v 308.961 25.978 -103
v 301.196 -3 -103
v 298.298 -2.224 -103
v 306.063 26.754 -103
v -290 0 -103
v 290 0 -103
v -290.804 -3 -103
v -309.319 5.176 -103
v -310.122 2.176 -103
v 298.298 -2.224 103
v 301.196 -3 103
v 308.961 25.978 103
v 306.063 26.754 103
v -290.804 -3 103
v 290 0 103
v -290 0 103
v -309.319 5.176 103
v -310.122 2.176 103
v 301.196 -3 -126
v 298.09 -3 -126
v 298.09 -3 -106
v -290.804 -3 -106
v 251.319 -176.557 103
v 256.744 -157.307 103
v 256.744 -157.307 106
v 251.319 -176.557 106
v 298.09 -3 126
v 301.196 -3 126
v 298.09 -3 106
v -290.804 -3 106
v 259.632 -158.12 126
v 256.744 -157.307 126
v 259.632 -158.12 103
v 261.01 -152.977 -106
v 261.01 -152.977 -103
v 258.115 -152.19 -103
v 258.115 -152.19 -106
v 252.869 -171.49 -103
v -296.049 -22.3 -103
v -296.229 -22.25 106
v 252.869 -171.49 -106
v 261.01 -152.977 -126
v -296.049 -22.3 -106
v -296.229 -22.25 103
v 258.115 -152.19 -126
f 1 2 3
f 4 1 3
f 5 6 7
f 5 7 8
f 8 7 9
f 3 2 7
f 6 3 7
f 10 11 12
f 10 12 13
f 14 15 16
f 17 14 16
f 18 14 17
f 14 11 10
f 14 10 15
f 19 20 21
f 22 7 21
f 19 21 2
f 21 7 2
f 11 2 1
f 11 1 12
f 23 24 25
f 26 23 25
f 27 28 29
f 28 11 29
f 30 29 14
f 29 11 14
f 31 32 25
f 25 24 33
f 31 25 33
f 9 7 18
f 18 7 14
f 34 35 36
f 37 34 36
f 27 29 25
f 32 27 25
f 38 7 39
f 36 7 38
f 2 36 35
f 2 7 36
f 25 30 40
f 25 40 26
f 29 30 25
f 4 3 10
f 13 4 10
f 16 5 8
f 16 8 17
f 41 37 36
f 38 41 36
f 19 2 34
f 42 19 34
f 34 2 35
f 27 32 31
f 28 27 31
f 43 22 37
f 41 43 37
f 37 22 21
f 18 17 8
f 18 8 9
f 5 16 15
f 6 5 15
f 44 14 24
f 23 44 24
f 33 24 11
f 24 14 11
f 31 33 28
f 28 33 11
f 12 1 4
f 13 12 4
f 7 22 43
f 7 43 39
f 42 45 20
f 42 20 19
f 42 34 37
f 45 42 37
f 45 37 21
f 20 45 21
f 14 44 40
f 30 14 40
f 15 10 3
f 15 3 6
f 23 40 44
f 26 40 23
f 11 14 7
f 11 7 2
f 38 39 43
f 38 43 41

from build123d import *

# Parameters (mm, degrees)
F0_W      = 580
F0_H      = 206
F1_DEPTH  = 3
F3_DEPTH  = 206
F4_W      = 3.1058285412
F4_H      = 206
F5_DEPTH  = 20
F6_DEPTH  = 206
F7_W      = 3
F7_H      = 206
F8_DEPTH  = 30
F9_DEPTH  = 3
F11_DEPTH = 3
F13_DEPTH = 20
F15_DEPTH = 20
F16_W     = 568.8317526069
F16_H     = 3
F17_DEPTH = 20
F18_W     = 568.8756012417
F18_H     = 3
F19_DEPTH = 20


# Not quite as in the source:
# - a feature names something its author has since deleted; it is built from what else it names


with BuildPart() as f1:
    # F0 (on Front) → F1 (new body)
    with BuildSketch(Plane.XZ):
        Rectangle(F0_W, F0_H)
    extrude(amount=F1_DEPTH)

    # F2 (on face) → F3 (join)
    with BuildSketch(Plane.XY.offset(103)):
        Polygon((-290, -3), (-290, 0), (-290.8038475773, -3), align=None)
    extrude(amount=-F3_DEPTH)

    # F4 (on face) → F5 (join)
    with BuildSketch(Plane(origin=(-270.5736835487, 72.5, 0), x_dir=(-0.2588190451, -0.9659258263, 0), z_dir=(-0.9659258263, 0.2588190451, 0))):
        with Locations((76.6104373503, 0)):
            Rectangle(F4_W, F4_H)
    extrude(amount=F5_DEPTH)

    # F2 (on face) → F6 (join)
    with BuildSketch(Plane.XY.offset(103)):
        Polygon((301.1961524227, -3), (290, 0), (290, -3), align=None)
    extrude(amount=-F6_DEPTH)

    # F7 (on face) → F8 (join)
    with BuildSketch(Plane(origin=(19.4263164513, 72.5, 0), x_dir=(-0.9659258263, 0.2588190451, 0), z_dir=(0.2588190451, 0.9659258263, 0))):
        with Locations((-290.2095995393, 0)):
            Rectangle(F7_W, F7_H)
    extrude(amount=F8_DEPTH)



with BuildPart() as f9:
    # F2 (on face) → F9 (new body)
    with BuildSketch(Plane.XY.offset(103)):
        Polygon((-290, -3), (-290.8038475773, -3), (259.6317745839, -158.1203698794), (301.1961524227, -3), (290, -3), align=None)
    extrude(amount=F9_DEPTH)

    # F14 (on face) → F15 (join)
    with BuildSketch(Plane.XY.offset(106)):
        Polygon((256.7442464871, -157.3066245323), (259.6317745839, -158.1203698794), (301.1961524227, -3), (298.0903238817, -3), align=None)
    extrude(amount=F15_DEPTH)


with BuildPart() as f11:
    # F10 (on face) → F11 (new body)
    with BuildSketch(Plane(origin=(0, 0, -103), x_dir=(1, 0, 0), z_dir=(0, 0, -1))):
        Polygon((261.0098994174, 152.9771379815), (-290.8038475773, 3), (301.1961524227, 3), align=None)
    extrude(amount=F11_DEPTH)

    # F12 (on face) → F13 (join)
    with BuildSketch(Plane(origin=(0, 0, -106), x_dir=(1, 0, 0), z_dir=(0, 0, -1))):
        Polygon((301.1961524227, 3), (261.0098994174, 152.9771379815), (258.1149198479, 152.1903131648), (298.0903240127, 3), align=None)
    extrude(amount=F13_DEPTH)


with BuildPart() as f1_1:
    add(f1.part)

    add(f11.part)  # F17 merges F11
    # F16 (on face) → F17 (join)
    with BuildSketch(Plane(origin=(-20.7631374105, -76.3942078643, 0), x_dir=(0.9649931898, -0.2622749389, 0), z_dir=(-0.2622749389, -0.9649931898, 0))):
        with Locations((4.5789686315, -104.5)):
            Rectangle(F16_W, F16_H)
    extrude(amount=F17_DEPTH)


    add(f9.part)  # F19 merges F9
    # F18 (on face) → F19 (join)
    with BuildSketch(Plane(origin=(-22.1793403036, -78.7021007532, 0), x_dir=(0.9625093656, -0.271248449, 0), z_dir=(-0.271248449, -0.9625093656, 0))):
        with Locations((5.3501191182, 104.5)):
            Rectangle(F18_W, F18_H)
    extrude(amount=F19_DEPTH)


solid = f1_1.part
